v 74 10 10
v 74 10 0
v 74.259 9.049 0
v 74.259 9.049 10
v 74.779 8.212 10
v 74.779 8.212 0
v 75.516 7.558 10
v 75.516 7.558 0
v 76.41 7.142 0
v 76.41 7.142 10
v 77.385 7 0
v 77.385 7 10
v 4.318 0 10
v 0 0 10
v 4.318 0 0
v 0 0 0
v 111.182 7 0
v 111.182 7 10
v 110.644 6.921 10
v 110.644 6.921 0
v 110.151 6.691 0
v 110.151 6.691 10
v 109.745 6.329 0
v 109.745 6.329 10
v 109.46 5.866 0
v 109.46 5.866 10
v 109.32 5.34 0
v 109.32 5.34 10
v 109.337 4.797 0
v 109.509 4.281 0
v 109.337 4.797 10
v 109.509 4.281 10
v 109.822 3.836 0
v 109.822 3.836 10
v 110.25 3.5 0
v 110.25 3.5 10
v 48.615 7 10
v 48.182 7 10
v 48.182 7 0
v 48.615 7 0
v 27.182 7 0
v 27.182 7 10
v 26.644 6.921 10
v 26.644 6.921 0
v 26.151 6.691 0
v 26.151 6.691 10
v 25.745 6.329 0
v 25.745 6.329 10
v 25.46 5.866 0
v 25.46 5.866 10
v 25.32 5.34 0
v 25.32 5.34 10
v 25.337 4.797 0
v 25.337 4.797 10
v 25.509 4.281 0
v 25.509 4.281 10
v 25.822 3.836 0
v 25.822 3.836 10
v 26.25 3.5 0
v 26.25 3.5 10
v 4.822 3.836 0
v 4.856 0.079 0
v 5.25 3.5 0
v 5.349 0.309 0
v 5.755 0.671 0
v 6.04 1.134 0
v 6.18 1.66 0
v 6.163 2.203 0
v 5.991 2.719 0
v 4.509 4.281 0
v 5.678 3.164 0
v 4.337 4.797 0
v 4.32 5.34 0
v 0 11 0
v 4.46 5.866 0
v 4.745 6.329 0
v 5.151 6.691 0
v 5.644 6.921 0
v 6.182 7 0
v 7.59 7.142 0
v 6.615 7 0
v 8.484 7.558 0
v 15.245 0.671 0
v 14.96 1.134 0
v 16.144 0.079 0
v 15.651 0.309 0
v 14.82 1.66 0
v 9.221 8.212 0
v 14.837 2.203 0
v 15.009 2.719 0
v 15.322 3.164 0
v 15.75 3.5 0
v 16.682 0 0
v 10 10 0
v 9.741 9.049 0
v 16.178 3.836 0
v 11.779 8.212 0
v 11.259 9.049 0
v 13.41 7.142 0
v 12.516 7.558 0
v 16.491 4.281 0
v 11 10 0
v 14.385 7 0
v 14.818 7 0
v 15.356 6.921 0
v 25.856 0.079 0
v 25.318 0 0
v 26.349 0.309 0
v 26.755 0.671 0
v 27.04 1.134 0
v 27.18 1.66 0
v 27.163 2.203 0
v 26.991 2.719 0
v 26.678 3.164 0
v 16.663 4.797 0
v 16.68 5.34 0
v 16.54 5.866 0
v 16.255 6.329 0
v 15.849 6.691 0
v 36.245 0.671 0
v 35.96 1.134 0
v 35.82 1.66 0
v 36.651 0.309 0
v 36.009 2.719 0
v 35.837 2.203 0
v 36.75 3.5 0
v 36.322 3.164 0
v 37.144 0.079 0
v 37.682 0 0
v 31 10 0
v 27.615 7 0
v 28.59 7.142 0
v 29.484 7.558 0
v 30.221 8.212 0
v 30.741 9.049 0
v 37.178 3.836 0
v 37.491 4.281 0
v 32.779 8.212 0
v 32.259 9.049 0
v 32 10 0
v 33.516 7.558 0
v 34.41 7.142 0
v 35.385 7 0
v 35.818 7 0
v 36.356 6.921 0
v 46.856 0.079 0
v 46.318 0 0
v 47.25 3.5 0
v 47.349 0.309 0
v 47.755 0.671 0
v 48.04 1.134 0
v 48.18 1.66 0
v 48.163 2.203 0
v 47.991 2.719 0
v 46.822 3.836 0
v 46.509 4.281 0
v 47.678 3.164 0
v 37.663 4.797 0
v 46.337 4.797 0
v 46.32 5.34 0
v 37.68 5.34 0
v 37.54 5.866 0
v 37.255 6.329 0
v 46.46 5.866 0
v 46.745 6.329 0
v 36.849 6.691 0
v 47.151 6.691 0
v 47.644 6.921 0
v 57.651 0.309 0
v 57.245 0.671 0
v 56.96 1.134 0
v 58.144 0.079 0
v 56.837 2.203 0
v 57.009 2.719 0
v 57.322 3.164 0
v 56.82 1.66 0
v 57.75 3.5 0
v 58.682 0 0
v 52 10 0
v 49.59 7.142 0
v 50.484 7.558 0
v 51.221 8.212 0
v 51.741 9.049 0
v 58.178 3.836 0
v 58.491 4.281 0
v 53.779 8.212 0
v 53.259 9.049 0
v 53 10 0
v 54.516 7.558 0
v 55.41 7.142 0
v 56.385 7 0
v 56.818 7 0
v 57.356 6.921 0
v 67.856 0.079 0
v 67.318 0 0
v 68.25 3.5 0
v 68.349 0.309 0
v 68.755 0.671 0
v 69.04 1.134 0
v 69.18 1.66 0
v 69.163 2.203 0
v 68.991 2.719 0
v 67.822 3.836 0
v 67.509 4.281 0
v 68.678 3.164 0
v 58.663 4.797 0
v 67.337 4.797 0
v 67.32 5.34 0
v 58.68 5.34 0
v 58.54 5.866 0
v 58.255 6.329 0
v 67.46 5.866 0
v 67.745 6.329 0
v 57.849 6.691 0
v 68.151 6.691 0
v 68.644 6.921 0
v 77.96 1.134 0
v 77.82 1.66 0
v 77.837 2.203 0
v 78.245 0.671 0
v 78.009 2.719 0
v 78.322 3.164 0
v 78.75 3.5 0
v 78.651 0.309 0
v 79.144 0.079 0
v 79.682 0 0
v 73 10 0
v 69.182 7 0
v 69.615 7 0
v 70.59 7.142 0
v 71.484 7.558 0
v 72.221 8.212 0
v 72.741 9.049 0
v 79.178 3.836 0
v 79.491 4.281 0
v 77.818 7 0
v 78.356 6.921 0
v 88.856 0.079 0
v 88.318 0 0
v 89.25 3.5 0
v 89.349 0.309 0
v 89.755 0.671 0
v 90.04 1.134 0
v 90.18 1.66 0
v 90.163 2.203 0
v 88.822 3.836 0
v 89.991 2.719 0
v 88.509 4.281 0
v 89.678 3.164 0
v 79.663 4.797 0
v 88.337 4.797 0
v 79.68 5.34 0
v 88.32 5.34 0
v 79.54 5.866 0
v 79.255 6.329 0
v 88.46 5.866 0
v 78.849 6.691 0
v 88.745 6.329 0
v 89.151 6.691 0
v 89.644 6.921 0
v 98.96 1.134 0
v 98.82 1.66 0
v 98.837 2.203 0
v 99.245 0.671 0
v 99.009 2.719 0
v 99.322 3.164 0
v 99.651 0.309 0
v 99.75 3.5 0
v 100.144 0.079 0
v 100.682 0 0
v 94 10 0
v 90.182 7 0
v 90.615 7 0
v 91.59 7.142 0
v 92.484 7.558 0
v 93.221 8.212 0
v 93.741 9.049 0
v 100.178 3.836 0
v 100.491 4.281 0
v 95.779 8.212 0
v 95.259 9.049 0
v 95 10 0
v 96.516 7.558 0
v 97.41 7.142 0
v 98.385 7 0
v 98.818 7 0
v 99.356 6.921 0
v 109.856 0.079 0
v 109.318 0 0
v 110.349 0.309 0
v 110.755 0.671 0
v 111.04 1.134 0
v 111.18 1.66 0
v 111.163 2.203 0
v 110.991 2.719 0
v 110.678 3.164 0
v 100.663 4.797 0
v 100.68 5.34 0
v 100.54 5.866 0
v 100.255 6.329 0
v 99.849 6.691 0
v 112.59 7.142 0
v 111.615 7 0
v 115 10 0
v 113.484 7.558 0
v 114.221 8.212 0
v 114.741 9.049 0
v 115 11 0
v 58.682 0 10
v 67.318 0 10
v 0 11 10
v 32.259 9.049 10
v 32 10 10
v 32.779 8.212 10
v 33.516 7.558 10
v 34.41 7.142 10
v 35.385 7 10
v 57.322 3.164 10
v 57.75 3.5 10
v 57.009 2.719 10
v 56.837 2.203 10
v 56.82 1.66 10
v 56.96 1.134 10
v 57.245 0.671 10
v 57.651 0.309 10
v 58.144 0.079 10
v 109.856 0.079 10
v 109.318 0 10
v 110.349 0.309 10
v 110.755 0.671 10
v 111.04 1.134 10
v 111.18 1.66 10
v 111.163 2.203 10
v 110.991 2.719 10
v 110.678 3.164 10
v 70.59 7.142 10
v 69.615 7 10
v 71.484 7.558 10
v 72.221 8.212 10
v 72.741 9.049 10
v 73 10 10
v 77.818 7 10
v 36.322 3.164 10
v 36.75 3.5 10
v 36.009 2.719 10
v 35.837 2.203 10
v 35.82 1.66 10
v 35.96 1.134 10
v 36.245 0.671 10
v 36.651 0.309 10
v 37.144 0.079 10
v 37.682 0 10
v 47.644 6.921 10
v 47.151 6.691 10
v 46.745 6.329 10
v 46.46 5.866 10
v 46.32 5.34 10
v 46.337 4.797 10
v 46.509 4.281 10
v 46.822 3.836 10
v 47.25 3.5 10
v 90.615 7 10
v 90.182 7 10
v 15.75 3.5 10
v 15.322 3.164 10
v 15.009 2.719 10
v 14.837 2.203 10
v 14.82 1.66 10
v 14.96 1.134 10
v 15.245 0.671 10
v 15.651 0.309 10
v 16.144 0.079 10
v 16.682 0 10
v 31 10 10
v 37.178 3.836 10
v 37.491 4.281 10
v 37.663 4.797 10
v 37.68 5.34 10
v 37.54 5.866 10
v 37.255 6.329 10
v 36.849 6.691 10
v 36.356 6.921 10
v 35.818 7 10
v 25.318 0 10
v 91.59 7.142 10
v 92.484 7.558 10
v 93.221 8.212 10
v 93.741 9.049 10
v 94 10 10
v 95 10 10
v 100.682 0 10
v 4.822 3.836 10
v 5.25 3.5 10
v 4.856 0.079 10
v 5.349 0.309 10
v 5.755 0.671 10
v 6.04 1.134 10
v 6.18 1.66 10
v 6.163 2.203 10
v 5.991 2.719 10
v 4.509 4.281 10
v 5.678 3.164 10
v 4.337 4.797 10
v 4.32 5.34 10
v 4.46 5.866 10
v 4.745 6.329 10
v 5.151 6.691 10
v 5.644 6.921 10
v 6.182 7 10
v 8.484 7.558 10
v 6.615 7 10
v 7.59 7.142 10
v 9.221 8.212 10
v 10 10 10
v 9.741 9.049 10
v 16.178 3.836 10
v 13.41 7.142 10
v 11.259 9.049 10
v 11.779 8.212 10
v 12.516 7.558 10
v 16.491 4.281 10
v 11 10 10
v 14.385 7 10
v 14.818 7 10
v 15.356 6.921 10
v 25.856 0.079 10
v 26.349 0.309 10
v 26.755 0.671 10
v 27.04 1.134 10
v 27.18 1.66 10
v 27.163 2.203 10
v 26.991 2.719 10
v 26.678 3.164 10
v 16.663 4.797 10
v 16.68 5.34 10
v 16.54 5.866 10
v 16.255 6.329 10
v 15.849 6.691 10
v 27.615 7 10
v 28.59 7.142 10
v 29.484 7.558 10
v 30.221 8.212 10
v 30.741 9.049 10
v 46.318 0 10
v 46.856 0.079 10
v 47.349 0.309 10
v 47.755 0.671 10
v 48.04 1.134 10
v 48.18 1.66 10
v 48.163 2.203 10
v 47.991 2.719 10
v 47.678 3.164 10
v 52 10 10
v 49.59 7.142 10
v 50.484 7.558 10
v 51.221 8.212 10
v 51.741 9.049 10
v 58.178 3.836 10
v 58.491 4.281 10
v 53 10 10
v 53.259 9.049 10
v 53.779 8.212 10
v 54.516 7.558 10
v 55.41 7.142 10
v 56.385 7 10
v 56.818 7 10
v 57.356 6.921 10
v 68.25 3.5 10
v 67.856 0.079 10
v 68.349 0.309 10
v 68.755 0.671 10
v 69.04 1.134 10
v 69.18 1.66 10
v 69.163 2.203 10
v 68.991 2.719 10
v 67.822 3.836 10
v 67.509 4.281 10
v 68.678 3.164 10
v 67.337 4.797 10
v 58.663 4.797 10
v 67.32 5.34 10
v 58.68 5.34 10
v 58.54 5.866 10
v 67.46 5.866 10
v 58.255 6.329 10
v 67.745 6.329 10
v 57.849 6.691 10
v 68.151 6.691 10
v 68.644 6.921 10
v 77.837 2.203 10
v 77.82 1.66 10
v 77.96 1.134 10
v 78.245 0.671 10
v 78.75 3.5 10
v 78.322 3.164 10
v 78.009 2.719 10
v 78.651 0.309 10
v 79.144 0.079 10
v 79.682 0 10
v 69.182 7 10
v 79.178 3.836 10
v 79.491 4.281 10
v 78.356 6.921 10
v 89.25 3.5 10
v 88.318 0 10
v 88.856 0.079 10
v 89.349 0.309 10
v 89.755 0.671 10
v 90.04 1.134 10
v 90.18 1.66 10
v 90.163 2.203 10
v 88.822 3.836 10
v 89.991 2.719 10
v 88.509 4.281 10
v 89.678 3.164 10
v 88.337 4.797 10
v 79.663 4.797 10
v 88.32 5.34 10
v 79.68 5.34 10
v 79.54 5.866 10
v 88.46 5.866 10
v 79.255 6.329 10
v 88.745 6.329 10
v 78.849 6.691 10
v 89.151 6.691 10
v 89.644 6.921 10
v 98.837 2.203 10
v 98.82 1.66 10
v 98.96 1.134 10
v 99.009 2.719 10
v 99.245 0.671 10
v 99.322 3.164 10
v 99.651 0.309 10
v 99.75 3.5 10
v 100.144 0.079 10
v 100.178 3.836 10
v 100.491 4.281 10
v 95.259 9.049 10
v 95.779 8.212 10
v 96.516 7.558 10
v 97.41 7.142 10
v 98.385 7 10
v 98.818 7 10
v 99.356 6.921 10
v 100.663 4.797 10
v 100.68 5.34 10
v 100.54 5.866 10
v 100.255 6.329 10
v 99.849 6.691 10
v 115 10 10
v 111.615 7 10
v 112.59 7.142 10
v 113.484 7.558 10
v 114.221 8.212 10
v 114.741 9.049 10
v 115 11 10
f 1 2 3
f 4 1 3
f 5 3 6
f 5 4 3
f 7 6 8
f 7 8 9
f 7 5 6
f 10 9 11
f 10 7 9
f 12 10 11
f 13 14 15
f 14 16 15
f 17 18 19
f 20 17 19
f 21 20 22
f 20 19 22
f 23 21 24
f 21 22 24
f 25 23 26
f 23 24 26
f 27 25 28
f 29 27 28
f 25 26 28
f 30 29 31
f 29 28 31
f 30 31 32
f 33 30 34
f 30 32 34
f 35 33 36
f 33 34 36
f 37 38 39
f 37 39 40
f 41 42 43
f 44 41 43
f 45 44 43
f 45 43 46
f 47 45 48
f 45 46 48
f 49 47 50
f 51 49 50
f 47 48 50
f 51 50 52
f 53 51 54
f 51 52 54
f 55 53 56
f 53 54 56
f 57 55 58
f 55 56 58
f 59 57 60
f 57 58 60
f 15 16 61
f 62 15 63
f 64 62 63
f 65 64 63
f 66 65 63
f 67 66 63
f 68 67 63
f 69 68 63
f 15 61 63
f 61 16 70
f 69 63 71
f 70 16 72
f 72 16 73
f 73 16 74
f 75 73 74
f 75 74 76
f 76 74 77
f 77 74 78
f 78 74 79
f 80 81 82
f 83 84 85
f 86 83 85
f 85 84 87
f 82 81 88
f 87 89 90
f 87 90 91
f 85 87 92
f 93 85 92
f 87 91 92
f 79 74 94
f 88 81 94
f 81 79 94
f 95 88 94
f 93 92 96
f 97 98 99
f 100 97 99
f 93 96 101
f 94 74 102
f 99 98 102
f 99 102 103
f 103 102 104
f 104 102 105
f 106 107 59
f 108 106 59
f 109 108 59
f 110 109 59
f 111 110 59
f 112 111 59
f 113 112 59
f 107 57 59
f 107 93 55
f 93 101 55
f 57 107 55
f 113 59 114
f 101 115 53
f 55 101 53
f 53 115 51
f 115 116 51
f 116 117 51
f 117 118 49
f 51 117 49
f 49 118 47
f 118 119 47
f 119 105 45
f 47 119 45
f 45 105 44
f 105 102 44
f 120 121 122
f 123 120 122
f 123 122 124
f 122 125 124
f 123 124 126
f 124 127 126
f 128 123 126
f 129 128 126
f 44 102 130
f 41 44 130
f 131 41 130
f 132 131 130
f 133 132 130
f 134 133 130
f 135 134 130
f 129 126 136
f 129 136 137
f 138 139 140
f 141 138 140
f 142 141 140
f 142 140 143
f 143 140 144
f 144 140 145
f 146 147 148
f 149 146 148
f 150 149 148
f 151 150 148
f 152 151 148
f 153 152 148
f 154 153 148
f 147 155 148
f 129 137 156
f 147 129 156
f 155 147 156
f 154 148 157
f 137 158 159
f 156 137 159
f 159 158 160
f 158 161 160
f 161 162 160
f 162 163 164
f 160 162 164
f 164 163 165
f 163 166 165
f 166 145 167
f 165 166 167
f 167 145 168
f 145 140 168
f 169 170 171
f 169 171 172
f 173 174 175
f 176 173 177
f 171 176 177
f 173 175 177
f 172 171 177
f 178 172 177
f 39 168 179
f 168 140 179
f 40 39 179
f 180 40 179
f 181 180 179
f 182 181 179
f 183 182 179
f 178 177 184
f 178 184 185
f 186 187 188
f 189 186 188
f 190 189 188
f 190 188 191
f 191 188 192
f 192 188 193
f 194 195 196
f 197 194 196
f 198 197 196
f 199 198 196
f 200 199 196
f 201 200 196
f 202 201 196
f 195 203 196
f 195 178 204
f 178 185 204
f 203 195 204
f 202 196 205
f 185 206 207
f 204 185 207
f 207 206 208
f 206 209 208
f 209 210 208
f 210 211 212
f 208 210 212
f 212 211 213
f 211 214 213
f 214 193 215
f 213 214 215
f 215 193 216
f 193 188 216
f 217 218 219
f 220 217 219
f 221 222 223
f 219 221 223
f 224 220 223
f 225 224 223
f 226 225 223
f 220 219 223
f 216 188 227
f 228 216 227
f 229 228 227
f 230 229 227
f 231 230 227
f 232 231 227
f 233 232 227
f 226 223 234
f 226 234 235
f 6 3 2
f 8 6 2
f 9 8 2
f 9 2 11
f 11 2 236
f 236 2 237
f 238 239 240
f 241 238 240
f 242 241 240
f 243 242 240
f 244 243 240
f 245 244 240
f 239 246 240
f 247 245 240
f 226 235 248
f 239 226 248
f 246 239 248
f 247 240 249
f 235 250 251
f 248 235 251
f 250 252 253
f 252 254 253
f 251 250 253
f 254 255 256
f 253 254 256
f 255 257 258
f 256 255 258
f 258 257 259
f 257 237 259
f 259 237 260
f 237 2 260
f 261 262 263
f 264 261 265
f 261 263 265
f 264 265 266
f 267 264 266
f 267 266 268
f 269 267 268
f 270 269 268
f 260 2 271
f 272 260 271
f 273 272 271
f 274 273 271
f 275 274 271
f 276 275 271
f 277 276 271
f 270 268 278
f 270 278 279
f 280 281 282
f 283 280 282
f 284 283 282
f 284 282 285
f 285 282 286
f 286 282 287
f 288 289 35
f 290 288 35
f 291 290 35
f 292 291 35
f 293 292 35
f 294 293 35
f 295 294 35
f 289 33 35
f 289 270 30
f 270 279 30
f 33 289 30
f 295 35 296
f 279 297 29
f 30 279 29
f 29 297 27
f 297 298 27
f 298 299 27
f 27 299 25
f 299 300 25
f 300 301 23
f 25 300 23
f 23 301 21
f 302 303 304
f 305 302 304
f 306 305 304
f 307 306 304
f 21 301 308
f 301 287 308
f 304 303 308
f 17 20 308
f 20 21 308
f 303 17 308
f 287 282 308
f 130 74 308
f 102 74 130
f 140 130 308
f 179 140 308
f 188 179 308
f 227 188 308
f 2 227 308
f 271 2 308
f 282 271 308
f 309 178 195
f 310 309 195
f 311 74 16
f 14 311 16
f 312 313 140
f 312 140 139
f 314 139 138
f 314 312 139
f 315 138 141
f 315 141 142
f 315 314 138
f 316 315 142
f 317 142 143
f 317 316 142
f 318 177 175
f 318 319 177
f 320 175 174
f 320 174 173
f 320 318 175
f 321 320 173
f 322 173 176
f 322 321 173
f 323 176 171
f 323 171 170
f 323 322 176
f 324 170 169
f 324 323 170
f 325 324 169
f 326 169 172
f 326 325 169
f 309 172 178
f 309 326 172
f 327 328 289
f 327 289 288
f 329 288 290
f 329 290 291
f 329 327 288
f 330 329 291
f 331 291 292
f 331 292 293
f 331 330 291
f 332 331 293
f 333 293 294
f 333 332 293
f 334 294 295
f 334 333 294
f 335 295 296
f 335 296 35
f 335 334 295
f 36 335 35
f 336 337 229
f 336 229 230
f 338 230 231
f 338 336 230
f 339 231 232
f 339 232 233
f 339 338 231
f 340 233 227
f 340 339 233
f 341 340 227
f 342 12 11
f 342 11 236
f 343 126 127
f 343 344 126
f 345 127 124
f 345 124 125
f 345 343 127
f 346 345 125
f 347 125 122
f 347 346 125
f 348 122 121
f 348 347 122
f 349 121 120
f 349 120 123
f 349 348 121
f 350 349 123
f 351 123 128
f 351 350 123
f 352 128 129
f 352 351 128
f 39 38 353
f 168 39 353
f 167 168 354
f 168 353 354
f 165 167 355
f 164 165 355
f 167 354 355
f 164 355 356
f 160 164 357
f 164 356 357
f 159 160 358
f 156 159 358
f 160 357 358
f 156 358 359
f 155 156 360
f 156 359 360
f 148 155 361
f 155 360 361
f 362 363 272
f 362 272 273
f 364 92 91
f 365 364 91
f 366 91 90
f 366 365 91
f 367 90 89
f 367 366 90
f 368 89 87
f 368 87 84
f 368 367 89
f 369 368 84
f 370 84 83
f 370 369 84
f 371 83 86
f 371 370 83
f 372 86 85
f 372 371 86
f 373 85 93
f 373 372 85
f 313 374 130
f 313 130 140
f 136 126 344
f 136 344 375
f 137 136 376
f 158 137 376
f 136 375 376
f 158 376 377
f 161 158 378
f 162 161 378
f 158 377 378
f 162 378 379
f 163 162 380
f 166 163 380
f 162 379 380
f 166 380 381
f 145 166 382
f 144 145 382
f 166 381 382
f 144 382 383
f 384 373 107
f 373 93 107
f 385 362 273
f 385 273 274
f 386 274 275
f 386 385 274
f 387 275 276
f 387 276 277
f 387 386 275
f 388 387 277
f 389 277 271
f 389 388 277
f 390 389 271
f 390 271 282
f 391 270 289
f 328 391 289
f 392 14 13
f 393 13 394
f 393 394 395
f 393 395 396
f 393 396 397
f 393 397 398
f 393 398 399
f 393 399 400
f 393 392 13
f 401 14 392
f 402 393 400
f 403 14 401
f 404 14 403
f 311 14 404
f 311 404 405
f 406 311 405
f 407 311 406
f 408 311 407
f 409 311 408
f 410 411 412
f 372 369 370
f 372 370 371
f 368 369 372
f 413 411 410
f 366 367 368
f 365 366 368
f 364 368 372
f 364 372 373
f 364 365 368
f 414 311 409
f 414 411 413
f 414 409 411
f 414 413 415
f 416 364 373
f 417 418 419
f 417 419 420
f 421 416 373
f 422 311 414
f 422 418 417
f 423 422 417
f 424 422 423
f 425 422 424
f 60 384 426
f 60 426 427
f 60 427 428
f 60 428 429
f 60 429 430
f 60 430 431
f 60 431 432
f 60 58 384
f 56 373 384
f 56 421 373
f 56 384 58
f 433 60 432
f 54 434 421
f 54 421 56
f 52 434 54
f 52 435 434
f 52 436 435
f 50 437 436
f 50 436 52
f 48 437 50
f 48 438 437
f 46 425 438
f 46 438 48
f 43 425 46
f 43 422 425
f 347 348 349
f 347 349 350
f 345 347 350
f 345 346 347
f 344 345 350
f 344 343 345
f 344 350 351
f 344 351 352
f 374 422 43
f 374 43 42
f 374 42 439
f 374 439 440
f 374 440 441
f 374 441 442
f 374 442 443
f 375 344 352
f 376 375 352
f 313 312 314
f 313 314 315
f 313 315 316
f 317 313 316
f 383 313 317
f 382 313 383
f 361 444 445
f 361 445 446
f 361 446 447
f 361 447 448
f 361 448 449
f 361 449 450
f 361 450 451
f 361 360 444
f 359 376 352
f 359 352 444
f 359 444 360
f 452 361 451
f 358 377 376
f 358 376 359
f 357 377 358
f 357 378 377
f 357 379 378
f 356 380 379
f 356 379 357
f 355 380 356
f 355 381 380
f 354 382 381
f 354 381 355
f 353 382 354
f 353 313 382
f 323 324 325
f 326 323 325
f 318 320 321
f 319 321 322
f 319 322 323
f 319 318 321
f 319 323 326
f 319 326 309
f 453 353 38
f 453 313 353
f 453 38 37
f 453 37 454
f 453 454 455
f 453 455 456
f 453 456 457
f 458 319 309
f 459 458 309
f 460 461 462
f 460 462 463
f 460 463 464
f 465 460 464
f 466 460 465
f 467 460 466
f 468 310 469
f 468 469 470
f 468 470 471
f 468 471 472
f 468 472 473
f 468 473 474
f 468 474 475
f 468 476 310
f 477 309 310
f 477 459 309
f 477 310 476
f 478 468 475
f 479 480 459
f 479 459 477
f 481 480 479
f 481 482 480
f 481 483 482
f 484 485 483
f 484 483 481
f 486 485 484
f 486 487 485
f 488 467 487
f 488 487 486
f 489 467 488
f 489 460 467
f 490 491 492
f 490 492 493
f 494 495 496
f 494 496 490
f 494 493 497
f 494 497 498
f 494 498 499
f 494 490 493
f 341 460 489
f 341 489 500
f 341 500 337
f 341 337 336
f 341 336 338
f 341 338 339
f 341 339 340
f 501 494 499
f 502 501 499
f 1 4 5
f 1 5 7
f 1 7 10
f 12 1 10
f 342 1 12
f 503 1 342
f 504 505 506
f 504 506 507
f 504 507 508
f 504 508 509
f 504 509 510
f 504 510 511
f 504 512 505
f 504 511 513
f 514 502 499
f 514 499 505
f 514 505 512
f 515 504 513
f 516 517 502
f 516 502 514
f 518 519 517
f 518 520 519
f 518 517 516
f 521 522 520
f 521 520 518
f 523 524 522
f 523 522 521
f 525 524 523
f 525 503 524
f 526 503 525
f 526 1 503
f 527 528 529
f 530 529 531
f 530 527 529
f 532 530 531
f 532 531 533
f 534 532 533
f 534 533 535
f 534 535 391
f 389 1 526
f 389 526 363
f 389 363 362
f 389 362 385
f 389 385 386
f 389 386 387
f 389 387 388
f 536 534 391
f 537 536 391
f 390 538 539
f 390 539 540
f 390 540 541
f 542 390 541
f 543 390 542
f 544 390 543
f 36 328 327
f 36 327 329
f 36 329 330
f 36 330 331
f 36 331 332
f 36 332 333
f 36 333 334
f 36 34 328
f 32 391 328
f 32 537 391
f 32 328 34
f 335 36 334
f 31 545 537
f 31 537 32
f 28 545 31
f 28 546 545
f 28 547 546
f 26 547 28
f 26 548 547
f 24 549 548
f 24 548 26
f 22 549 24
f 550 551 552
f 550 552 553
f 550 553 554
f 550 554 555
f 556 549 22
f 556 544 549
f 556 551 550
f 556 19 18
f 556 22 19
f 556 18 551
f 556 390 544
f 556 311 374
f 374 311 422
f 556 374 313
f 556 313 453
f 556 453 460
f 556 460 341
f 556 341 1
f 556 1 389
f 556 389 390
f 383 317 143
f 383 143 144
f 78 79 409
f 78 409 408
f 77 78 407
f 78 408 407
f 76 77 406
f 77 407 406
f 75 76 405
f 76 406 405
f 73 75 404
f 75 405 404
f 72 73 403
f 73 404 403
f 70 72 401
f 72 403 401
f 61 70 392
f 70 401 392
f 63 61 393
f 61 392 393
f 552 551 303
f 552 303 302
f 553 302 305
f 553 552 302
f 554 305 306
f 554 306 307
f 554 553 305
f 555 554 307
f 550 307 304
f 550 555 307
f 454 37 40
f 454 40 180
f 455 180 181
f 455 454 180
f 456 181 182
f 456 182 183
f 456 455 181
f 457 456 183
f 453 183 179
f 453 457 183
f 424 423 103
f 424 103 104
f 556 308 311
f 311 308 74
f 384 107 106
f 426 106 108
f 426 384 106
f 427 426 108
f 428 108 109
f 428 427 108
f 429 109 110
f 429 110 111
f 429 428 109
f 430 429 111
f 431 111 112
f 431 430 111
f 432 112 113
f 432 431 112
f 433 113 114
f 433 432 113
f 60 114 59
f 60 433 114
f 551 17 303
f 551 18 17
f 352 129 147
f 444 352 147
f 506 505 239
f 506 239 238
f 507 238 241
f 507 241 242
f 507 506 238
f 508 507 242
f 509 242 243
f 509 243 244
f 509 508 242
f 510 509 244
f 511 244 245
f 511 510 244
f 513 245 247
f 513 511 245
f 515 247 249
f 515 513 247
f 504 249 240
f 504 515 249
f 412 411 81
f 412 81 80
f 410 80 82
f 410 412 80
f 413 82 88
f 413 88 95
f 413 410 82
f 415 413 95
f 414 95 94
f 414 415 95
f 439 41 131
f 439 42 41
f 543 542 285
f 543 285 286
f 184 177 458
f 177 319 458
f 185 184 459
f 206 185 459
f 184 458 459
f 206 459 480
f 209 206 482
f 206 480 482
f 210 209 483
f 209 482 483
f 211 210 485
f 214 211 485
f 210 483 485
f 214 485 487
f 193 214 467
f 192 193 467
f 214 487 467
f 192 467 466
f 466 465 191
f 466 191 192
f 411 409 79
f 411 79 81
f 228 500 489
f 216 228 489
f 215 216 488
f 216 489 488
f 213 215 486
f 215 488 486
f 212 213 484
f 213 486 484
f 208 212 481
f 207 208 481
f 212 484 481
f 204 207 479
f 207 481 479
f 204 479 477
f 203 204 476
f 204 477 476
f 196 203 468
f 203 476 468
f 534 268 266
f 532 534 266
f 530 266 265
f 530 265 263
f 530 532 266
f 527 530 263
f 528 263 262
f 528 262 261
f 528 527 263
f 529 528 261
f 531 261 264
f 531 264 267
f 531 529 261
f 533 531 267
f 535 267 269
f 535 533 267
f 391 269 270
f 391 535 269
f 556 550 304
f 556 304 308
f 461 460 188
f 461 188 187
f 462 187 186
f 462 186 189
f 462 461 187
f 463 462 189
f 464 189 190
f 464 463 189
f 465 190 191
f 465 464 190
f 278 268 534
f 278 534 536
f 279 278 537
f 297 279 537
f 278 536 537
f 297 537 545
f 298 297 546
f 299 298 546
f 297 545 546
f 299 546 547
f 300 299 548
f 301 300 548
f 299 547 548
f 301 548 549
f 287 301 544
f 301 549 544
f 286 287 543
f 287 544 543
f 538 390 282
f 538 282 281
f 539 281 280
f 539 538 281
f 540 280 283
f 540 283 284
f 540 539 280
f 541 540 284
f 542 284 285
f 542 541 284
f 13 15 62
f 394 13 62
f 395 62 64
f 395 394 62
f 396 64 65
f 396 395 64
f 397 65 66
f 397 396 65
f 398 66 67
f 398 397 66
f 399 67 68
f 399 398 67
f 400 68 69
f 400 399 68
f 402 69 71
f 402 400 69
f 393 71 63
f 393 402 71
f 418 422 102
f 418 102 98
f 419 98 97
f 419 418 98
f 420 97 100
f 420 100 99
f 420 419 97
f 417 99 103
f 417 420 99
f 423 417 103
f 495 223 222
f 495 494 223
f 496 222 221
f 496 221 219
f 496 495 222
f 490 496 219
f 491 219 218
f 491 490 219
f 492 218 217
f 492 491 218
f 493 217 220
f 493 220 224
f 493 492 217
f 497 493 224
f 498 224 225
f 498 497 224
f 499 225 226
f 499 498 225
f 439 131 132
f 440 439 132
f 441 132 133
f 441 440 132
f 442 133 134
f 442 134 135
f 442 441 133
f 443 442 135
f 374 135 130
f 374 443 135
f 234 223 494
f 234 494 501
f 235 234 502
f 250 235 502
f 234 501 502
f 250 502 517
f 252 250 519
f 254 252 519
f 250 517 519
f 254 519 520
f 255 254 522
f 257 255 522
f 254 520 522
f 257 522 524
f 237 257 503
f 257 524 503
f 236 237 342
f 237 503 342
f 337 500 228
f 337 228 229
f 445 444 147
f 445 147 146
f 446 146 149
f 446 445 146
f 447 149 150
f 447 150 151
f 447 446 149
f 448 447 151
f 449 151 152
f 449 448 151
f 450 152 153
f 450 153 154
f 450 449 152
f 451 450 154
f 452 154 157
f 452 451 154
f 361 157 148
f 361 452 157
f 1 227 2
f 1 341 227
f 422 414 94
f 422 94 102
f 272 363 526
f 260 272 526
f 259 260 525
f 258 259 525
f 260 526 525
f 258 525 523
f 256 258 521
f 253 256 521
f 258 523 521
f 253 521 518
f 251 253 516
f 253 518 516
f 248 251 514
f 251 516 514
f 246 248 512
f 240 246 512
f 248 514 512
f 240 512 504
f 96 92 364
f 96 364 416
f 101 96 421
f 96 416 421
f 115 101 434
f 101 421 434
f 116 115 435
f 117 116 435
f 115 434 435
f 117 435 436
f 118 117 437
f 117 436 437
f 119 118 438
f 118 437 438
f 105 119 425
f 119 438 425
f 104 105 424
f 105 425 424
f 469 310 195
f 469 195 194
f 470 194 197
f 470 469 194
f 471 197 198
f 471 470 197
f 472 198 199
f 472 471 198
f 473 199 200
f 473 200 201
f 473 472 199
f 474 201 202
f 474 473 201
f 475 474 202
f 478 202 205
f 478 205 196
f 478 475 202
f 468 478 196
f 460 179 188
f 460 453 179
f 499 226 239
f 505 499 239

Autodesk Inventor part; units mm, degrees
ref_plane "YZ Plane" through (0, 0, 0) normal (1, 0, 0) x (0, 1, 0)
ref_plane "XZ Plane" through (0, 0, 0) normal (0, 1, 0) x (-1, 0, 0)
ref_plane "XY Plane" through (0, 0, 0) normal (0, 0, 1) x (1, 0, 0)
sketch "Sketch1" plane through (0, 0, 0) normal (0, 0, 1) x (1, 0, 0)
  line L0 (0, 0) -> (21, 0)
  line L1 (21, 0) -> (21, 11)
  line L2 (21, 11) -> (0, 11)
  line L3 (0, 11) -> (0, 0)
  dimension "d0" = 21
  dimension "d1" = 11
extrude "Extrusion1" add sketch "Sketch1" along normal blind 10
sketch "Sketch2" plane through (0, 0, 10) normal (0, 0, 1) x (1, 0, 0)
  line L0 (0, 0) -> (21, 0) projected
  arc A0 (4.3181, 0) -> (5.25, 3.5) centre (4.3181, 1.8741) ccw
  arc A1 (6.1819, 7) -> (5.25, 3.5) centre (6.1819, 5.1259) ccw
  arc A2 (15.75, 3.5) -> (16.6819, 0) centre (16.6819, 1.8741) ccw
  arc A3 (15.75, 3.5) -> (14.8181, 7) centre (14.8181, 5.1259) ccw
  line L1 (6.1819, 7) -> (14.8181, 7)
  line L2 (21, 11) -> (0, 11) projected
  line L3 (4.3181, 1.8741) -> (6.1819, 5.1259) construction
  line L4 (16.6819, 1.8741) -> (14.8181, 5.1259) construction
  line L5 (0, 11) -> (0, 0) construction
  line L6 (21, 0) -> (21, 11) construction
  point P0 (10.5, 7)
  point P1 (15.75, 3.5)
  dimension "d7" = 10.5
  dimension "d9" = 7
  dimension "d13" = 10.5
extrude "Extrusion2" cut sketch "Sketch2" against normal through all
sketch "Sketch3" plane through (0, 0, 10) normal (0, 0, 1) x (1, 0, 0)
  line L0 (21, 11) -> (0, 11) projected
  line L1 (14.8181, 7) -> (6.1819, 7) projected
  arc A0 (6.6147, 7) -> (10, 10) centre (6.6147, 10.41) ccw
  arc A1 (11, 10) -> (14.3853, 7) centre (14.3853, 10.41) ccw
  line L2 (10, 10) -> (11, 10)
  line L3 (6.1819, 7) -> (14.8181, 7) projected
  line L4 (10.5, 10) -> (10.5, 11) construction
  point P0 (0, 0)
  dimension "d15" = 1
  dimension "d16" = 1
extrude "Extrusion3" cut sketch "Sketch3" against normal through all
pattern_linear "Rectangular Pattern1" count 6 spacing 21 along (1, 0, 0)
sketch "Sketch4" plane through (0, 0, 10) normal (0, 0, 1) x (1, 0, 0)
  line L0 (115, 10) -> (116, 10) projected
  line L1 (115, 10) -> (115, 11)
  line L2 (126, 11) -> (0, 11) projected
  line L3 (121.6819, 0) -> (126, 0) projected
  line L4 (121.6819, 0) -> (126, 0)
  line L5 (126, 0) -> (126, 11)
  line L6 (126, 0) -> (126, 11) projected
  line L7 (126, 11) -> (115, 11)
  arc A0 (116, 10) -> (119.3853, 7) centre (119.3853, 10.41) ccw projected
  line L8 (115, 10) -> (116, 10)
  line L9 (119.3853, 7) -> (119.8181, 7) projected
  arc A1 (116, 10) -> (119.3853, 7) centre (119.3853, 10.41) ccw
  arc A2 (120.75, 3.5) -> (119.8181, 7) centre (119.8181, 5.1259) ccw projected
  line L10 (119.3853, 7) -> (119.8181, 7)
  arc A3 (120.75, 3.5) -> (119.8181, 7) centre (119.8181, 5.1259) ccw
  arc A4 (120.75, 3.5) -> (121.6819, 0) centre (121.6819, 1.8741) ccw projected
  arc A5 (120.75, 3.5) -> (121.6819, 0) centre (121.6819, 1.8741) ccw
  point P0 (0, 0)
extrude "Extrusion4" cut sketch "Sketch4" against normal through all
properties part number "Zipperteethv3"
